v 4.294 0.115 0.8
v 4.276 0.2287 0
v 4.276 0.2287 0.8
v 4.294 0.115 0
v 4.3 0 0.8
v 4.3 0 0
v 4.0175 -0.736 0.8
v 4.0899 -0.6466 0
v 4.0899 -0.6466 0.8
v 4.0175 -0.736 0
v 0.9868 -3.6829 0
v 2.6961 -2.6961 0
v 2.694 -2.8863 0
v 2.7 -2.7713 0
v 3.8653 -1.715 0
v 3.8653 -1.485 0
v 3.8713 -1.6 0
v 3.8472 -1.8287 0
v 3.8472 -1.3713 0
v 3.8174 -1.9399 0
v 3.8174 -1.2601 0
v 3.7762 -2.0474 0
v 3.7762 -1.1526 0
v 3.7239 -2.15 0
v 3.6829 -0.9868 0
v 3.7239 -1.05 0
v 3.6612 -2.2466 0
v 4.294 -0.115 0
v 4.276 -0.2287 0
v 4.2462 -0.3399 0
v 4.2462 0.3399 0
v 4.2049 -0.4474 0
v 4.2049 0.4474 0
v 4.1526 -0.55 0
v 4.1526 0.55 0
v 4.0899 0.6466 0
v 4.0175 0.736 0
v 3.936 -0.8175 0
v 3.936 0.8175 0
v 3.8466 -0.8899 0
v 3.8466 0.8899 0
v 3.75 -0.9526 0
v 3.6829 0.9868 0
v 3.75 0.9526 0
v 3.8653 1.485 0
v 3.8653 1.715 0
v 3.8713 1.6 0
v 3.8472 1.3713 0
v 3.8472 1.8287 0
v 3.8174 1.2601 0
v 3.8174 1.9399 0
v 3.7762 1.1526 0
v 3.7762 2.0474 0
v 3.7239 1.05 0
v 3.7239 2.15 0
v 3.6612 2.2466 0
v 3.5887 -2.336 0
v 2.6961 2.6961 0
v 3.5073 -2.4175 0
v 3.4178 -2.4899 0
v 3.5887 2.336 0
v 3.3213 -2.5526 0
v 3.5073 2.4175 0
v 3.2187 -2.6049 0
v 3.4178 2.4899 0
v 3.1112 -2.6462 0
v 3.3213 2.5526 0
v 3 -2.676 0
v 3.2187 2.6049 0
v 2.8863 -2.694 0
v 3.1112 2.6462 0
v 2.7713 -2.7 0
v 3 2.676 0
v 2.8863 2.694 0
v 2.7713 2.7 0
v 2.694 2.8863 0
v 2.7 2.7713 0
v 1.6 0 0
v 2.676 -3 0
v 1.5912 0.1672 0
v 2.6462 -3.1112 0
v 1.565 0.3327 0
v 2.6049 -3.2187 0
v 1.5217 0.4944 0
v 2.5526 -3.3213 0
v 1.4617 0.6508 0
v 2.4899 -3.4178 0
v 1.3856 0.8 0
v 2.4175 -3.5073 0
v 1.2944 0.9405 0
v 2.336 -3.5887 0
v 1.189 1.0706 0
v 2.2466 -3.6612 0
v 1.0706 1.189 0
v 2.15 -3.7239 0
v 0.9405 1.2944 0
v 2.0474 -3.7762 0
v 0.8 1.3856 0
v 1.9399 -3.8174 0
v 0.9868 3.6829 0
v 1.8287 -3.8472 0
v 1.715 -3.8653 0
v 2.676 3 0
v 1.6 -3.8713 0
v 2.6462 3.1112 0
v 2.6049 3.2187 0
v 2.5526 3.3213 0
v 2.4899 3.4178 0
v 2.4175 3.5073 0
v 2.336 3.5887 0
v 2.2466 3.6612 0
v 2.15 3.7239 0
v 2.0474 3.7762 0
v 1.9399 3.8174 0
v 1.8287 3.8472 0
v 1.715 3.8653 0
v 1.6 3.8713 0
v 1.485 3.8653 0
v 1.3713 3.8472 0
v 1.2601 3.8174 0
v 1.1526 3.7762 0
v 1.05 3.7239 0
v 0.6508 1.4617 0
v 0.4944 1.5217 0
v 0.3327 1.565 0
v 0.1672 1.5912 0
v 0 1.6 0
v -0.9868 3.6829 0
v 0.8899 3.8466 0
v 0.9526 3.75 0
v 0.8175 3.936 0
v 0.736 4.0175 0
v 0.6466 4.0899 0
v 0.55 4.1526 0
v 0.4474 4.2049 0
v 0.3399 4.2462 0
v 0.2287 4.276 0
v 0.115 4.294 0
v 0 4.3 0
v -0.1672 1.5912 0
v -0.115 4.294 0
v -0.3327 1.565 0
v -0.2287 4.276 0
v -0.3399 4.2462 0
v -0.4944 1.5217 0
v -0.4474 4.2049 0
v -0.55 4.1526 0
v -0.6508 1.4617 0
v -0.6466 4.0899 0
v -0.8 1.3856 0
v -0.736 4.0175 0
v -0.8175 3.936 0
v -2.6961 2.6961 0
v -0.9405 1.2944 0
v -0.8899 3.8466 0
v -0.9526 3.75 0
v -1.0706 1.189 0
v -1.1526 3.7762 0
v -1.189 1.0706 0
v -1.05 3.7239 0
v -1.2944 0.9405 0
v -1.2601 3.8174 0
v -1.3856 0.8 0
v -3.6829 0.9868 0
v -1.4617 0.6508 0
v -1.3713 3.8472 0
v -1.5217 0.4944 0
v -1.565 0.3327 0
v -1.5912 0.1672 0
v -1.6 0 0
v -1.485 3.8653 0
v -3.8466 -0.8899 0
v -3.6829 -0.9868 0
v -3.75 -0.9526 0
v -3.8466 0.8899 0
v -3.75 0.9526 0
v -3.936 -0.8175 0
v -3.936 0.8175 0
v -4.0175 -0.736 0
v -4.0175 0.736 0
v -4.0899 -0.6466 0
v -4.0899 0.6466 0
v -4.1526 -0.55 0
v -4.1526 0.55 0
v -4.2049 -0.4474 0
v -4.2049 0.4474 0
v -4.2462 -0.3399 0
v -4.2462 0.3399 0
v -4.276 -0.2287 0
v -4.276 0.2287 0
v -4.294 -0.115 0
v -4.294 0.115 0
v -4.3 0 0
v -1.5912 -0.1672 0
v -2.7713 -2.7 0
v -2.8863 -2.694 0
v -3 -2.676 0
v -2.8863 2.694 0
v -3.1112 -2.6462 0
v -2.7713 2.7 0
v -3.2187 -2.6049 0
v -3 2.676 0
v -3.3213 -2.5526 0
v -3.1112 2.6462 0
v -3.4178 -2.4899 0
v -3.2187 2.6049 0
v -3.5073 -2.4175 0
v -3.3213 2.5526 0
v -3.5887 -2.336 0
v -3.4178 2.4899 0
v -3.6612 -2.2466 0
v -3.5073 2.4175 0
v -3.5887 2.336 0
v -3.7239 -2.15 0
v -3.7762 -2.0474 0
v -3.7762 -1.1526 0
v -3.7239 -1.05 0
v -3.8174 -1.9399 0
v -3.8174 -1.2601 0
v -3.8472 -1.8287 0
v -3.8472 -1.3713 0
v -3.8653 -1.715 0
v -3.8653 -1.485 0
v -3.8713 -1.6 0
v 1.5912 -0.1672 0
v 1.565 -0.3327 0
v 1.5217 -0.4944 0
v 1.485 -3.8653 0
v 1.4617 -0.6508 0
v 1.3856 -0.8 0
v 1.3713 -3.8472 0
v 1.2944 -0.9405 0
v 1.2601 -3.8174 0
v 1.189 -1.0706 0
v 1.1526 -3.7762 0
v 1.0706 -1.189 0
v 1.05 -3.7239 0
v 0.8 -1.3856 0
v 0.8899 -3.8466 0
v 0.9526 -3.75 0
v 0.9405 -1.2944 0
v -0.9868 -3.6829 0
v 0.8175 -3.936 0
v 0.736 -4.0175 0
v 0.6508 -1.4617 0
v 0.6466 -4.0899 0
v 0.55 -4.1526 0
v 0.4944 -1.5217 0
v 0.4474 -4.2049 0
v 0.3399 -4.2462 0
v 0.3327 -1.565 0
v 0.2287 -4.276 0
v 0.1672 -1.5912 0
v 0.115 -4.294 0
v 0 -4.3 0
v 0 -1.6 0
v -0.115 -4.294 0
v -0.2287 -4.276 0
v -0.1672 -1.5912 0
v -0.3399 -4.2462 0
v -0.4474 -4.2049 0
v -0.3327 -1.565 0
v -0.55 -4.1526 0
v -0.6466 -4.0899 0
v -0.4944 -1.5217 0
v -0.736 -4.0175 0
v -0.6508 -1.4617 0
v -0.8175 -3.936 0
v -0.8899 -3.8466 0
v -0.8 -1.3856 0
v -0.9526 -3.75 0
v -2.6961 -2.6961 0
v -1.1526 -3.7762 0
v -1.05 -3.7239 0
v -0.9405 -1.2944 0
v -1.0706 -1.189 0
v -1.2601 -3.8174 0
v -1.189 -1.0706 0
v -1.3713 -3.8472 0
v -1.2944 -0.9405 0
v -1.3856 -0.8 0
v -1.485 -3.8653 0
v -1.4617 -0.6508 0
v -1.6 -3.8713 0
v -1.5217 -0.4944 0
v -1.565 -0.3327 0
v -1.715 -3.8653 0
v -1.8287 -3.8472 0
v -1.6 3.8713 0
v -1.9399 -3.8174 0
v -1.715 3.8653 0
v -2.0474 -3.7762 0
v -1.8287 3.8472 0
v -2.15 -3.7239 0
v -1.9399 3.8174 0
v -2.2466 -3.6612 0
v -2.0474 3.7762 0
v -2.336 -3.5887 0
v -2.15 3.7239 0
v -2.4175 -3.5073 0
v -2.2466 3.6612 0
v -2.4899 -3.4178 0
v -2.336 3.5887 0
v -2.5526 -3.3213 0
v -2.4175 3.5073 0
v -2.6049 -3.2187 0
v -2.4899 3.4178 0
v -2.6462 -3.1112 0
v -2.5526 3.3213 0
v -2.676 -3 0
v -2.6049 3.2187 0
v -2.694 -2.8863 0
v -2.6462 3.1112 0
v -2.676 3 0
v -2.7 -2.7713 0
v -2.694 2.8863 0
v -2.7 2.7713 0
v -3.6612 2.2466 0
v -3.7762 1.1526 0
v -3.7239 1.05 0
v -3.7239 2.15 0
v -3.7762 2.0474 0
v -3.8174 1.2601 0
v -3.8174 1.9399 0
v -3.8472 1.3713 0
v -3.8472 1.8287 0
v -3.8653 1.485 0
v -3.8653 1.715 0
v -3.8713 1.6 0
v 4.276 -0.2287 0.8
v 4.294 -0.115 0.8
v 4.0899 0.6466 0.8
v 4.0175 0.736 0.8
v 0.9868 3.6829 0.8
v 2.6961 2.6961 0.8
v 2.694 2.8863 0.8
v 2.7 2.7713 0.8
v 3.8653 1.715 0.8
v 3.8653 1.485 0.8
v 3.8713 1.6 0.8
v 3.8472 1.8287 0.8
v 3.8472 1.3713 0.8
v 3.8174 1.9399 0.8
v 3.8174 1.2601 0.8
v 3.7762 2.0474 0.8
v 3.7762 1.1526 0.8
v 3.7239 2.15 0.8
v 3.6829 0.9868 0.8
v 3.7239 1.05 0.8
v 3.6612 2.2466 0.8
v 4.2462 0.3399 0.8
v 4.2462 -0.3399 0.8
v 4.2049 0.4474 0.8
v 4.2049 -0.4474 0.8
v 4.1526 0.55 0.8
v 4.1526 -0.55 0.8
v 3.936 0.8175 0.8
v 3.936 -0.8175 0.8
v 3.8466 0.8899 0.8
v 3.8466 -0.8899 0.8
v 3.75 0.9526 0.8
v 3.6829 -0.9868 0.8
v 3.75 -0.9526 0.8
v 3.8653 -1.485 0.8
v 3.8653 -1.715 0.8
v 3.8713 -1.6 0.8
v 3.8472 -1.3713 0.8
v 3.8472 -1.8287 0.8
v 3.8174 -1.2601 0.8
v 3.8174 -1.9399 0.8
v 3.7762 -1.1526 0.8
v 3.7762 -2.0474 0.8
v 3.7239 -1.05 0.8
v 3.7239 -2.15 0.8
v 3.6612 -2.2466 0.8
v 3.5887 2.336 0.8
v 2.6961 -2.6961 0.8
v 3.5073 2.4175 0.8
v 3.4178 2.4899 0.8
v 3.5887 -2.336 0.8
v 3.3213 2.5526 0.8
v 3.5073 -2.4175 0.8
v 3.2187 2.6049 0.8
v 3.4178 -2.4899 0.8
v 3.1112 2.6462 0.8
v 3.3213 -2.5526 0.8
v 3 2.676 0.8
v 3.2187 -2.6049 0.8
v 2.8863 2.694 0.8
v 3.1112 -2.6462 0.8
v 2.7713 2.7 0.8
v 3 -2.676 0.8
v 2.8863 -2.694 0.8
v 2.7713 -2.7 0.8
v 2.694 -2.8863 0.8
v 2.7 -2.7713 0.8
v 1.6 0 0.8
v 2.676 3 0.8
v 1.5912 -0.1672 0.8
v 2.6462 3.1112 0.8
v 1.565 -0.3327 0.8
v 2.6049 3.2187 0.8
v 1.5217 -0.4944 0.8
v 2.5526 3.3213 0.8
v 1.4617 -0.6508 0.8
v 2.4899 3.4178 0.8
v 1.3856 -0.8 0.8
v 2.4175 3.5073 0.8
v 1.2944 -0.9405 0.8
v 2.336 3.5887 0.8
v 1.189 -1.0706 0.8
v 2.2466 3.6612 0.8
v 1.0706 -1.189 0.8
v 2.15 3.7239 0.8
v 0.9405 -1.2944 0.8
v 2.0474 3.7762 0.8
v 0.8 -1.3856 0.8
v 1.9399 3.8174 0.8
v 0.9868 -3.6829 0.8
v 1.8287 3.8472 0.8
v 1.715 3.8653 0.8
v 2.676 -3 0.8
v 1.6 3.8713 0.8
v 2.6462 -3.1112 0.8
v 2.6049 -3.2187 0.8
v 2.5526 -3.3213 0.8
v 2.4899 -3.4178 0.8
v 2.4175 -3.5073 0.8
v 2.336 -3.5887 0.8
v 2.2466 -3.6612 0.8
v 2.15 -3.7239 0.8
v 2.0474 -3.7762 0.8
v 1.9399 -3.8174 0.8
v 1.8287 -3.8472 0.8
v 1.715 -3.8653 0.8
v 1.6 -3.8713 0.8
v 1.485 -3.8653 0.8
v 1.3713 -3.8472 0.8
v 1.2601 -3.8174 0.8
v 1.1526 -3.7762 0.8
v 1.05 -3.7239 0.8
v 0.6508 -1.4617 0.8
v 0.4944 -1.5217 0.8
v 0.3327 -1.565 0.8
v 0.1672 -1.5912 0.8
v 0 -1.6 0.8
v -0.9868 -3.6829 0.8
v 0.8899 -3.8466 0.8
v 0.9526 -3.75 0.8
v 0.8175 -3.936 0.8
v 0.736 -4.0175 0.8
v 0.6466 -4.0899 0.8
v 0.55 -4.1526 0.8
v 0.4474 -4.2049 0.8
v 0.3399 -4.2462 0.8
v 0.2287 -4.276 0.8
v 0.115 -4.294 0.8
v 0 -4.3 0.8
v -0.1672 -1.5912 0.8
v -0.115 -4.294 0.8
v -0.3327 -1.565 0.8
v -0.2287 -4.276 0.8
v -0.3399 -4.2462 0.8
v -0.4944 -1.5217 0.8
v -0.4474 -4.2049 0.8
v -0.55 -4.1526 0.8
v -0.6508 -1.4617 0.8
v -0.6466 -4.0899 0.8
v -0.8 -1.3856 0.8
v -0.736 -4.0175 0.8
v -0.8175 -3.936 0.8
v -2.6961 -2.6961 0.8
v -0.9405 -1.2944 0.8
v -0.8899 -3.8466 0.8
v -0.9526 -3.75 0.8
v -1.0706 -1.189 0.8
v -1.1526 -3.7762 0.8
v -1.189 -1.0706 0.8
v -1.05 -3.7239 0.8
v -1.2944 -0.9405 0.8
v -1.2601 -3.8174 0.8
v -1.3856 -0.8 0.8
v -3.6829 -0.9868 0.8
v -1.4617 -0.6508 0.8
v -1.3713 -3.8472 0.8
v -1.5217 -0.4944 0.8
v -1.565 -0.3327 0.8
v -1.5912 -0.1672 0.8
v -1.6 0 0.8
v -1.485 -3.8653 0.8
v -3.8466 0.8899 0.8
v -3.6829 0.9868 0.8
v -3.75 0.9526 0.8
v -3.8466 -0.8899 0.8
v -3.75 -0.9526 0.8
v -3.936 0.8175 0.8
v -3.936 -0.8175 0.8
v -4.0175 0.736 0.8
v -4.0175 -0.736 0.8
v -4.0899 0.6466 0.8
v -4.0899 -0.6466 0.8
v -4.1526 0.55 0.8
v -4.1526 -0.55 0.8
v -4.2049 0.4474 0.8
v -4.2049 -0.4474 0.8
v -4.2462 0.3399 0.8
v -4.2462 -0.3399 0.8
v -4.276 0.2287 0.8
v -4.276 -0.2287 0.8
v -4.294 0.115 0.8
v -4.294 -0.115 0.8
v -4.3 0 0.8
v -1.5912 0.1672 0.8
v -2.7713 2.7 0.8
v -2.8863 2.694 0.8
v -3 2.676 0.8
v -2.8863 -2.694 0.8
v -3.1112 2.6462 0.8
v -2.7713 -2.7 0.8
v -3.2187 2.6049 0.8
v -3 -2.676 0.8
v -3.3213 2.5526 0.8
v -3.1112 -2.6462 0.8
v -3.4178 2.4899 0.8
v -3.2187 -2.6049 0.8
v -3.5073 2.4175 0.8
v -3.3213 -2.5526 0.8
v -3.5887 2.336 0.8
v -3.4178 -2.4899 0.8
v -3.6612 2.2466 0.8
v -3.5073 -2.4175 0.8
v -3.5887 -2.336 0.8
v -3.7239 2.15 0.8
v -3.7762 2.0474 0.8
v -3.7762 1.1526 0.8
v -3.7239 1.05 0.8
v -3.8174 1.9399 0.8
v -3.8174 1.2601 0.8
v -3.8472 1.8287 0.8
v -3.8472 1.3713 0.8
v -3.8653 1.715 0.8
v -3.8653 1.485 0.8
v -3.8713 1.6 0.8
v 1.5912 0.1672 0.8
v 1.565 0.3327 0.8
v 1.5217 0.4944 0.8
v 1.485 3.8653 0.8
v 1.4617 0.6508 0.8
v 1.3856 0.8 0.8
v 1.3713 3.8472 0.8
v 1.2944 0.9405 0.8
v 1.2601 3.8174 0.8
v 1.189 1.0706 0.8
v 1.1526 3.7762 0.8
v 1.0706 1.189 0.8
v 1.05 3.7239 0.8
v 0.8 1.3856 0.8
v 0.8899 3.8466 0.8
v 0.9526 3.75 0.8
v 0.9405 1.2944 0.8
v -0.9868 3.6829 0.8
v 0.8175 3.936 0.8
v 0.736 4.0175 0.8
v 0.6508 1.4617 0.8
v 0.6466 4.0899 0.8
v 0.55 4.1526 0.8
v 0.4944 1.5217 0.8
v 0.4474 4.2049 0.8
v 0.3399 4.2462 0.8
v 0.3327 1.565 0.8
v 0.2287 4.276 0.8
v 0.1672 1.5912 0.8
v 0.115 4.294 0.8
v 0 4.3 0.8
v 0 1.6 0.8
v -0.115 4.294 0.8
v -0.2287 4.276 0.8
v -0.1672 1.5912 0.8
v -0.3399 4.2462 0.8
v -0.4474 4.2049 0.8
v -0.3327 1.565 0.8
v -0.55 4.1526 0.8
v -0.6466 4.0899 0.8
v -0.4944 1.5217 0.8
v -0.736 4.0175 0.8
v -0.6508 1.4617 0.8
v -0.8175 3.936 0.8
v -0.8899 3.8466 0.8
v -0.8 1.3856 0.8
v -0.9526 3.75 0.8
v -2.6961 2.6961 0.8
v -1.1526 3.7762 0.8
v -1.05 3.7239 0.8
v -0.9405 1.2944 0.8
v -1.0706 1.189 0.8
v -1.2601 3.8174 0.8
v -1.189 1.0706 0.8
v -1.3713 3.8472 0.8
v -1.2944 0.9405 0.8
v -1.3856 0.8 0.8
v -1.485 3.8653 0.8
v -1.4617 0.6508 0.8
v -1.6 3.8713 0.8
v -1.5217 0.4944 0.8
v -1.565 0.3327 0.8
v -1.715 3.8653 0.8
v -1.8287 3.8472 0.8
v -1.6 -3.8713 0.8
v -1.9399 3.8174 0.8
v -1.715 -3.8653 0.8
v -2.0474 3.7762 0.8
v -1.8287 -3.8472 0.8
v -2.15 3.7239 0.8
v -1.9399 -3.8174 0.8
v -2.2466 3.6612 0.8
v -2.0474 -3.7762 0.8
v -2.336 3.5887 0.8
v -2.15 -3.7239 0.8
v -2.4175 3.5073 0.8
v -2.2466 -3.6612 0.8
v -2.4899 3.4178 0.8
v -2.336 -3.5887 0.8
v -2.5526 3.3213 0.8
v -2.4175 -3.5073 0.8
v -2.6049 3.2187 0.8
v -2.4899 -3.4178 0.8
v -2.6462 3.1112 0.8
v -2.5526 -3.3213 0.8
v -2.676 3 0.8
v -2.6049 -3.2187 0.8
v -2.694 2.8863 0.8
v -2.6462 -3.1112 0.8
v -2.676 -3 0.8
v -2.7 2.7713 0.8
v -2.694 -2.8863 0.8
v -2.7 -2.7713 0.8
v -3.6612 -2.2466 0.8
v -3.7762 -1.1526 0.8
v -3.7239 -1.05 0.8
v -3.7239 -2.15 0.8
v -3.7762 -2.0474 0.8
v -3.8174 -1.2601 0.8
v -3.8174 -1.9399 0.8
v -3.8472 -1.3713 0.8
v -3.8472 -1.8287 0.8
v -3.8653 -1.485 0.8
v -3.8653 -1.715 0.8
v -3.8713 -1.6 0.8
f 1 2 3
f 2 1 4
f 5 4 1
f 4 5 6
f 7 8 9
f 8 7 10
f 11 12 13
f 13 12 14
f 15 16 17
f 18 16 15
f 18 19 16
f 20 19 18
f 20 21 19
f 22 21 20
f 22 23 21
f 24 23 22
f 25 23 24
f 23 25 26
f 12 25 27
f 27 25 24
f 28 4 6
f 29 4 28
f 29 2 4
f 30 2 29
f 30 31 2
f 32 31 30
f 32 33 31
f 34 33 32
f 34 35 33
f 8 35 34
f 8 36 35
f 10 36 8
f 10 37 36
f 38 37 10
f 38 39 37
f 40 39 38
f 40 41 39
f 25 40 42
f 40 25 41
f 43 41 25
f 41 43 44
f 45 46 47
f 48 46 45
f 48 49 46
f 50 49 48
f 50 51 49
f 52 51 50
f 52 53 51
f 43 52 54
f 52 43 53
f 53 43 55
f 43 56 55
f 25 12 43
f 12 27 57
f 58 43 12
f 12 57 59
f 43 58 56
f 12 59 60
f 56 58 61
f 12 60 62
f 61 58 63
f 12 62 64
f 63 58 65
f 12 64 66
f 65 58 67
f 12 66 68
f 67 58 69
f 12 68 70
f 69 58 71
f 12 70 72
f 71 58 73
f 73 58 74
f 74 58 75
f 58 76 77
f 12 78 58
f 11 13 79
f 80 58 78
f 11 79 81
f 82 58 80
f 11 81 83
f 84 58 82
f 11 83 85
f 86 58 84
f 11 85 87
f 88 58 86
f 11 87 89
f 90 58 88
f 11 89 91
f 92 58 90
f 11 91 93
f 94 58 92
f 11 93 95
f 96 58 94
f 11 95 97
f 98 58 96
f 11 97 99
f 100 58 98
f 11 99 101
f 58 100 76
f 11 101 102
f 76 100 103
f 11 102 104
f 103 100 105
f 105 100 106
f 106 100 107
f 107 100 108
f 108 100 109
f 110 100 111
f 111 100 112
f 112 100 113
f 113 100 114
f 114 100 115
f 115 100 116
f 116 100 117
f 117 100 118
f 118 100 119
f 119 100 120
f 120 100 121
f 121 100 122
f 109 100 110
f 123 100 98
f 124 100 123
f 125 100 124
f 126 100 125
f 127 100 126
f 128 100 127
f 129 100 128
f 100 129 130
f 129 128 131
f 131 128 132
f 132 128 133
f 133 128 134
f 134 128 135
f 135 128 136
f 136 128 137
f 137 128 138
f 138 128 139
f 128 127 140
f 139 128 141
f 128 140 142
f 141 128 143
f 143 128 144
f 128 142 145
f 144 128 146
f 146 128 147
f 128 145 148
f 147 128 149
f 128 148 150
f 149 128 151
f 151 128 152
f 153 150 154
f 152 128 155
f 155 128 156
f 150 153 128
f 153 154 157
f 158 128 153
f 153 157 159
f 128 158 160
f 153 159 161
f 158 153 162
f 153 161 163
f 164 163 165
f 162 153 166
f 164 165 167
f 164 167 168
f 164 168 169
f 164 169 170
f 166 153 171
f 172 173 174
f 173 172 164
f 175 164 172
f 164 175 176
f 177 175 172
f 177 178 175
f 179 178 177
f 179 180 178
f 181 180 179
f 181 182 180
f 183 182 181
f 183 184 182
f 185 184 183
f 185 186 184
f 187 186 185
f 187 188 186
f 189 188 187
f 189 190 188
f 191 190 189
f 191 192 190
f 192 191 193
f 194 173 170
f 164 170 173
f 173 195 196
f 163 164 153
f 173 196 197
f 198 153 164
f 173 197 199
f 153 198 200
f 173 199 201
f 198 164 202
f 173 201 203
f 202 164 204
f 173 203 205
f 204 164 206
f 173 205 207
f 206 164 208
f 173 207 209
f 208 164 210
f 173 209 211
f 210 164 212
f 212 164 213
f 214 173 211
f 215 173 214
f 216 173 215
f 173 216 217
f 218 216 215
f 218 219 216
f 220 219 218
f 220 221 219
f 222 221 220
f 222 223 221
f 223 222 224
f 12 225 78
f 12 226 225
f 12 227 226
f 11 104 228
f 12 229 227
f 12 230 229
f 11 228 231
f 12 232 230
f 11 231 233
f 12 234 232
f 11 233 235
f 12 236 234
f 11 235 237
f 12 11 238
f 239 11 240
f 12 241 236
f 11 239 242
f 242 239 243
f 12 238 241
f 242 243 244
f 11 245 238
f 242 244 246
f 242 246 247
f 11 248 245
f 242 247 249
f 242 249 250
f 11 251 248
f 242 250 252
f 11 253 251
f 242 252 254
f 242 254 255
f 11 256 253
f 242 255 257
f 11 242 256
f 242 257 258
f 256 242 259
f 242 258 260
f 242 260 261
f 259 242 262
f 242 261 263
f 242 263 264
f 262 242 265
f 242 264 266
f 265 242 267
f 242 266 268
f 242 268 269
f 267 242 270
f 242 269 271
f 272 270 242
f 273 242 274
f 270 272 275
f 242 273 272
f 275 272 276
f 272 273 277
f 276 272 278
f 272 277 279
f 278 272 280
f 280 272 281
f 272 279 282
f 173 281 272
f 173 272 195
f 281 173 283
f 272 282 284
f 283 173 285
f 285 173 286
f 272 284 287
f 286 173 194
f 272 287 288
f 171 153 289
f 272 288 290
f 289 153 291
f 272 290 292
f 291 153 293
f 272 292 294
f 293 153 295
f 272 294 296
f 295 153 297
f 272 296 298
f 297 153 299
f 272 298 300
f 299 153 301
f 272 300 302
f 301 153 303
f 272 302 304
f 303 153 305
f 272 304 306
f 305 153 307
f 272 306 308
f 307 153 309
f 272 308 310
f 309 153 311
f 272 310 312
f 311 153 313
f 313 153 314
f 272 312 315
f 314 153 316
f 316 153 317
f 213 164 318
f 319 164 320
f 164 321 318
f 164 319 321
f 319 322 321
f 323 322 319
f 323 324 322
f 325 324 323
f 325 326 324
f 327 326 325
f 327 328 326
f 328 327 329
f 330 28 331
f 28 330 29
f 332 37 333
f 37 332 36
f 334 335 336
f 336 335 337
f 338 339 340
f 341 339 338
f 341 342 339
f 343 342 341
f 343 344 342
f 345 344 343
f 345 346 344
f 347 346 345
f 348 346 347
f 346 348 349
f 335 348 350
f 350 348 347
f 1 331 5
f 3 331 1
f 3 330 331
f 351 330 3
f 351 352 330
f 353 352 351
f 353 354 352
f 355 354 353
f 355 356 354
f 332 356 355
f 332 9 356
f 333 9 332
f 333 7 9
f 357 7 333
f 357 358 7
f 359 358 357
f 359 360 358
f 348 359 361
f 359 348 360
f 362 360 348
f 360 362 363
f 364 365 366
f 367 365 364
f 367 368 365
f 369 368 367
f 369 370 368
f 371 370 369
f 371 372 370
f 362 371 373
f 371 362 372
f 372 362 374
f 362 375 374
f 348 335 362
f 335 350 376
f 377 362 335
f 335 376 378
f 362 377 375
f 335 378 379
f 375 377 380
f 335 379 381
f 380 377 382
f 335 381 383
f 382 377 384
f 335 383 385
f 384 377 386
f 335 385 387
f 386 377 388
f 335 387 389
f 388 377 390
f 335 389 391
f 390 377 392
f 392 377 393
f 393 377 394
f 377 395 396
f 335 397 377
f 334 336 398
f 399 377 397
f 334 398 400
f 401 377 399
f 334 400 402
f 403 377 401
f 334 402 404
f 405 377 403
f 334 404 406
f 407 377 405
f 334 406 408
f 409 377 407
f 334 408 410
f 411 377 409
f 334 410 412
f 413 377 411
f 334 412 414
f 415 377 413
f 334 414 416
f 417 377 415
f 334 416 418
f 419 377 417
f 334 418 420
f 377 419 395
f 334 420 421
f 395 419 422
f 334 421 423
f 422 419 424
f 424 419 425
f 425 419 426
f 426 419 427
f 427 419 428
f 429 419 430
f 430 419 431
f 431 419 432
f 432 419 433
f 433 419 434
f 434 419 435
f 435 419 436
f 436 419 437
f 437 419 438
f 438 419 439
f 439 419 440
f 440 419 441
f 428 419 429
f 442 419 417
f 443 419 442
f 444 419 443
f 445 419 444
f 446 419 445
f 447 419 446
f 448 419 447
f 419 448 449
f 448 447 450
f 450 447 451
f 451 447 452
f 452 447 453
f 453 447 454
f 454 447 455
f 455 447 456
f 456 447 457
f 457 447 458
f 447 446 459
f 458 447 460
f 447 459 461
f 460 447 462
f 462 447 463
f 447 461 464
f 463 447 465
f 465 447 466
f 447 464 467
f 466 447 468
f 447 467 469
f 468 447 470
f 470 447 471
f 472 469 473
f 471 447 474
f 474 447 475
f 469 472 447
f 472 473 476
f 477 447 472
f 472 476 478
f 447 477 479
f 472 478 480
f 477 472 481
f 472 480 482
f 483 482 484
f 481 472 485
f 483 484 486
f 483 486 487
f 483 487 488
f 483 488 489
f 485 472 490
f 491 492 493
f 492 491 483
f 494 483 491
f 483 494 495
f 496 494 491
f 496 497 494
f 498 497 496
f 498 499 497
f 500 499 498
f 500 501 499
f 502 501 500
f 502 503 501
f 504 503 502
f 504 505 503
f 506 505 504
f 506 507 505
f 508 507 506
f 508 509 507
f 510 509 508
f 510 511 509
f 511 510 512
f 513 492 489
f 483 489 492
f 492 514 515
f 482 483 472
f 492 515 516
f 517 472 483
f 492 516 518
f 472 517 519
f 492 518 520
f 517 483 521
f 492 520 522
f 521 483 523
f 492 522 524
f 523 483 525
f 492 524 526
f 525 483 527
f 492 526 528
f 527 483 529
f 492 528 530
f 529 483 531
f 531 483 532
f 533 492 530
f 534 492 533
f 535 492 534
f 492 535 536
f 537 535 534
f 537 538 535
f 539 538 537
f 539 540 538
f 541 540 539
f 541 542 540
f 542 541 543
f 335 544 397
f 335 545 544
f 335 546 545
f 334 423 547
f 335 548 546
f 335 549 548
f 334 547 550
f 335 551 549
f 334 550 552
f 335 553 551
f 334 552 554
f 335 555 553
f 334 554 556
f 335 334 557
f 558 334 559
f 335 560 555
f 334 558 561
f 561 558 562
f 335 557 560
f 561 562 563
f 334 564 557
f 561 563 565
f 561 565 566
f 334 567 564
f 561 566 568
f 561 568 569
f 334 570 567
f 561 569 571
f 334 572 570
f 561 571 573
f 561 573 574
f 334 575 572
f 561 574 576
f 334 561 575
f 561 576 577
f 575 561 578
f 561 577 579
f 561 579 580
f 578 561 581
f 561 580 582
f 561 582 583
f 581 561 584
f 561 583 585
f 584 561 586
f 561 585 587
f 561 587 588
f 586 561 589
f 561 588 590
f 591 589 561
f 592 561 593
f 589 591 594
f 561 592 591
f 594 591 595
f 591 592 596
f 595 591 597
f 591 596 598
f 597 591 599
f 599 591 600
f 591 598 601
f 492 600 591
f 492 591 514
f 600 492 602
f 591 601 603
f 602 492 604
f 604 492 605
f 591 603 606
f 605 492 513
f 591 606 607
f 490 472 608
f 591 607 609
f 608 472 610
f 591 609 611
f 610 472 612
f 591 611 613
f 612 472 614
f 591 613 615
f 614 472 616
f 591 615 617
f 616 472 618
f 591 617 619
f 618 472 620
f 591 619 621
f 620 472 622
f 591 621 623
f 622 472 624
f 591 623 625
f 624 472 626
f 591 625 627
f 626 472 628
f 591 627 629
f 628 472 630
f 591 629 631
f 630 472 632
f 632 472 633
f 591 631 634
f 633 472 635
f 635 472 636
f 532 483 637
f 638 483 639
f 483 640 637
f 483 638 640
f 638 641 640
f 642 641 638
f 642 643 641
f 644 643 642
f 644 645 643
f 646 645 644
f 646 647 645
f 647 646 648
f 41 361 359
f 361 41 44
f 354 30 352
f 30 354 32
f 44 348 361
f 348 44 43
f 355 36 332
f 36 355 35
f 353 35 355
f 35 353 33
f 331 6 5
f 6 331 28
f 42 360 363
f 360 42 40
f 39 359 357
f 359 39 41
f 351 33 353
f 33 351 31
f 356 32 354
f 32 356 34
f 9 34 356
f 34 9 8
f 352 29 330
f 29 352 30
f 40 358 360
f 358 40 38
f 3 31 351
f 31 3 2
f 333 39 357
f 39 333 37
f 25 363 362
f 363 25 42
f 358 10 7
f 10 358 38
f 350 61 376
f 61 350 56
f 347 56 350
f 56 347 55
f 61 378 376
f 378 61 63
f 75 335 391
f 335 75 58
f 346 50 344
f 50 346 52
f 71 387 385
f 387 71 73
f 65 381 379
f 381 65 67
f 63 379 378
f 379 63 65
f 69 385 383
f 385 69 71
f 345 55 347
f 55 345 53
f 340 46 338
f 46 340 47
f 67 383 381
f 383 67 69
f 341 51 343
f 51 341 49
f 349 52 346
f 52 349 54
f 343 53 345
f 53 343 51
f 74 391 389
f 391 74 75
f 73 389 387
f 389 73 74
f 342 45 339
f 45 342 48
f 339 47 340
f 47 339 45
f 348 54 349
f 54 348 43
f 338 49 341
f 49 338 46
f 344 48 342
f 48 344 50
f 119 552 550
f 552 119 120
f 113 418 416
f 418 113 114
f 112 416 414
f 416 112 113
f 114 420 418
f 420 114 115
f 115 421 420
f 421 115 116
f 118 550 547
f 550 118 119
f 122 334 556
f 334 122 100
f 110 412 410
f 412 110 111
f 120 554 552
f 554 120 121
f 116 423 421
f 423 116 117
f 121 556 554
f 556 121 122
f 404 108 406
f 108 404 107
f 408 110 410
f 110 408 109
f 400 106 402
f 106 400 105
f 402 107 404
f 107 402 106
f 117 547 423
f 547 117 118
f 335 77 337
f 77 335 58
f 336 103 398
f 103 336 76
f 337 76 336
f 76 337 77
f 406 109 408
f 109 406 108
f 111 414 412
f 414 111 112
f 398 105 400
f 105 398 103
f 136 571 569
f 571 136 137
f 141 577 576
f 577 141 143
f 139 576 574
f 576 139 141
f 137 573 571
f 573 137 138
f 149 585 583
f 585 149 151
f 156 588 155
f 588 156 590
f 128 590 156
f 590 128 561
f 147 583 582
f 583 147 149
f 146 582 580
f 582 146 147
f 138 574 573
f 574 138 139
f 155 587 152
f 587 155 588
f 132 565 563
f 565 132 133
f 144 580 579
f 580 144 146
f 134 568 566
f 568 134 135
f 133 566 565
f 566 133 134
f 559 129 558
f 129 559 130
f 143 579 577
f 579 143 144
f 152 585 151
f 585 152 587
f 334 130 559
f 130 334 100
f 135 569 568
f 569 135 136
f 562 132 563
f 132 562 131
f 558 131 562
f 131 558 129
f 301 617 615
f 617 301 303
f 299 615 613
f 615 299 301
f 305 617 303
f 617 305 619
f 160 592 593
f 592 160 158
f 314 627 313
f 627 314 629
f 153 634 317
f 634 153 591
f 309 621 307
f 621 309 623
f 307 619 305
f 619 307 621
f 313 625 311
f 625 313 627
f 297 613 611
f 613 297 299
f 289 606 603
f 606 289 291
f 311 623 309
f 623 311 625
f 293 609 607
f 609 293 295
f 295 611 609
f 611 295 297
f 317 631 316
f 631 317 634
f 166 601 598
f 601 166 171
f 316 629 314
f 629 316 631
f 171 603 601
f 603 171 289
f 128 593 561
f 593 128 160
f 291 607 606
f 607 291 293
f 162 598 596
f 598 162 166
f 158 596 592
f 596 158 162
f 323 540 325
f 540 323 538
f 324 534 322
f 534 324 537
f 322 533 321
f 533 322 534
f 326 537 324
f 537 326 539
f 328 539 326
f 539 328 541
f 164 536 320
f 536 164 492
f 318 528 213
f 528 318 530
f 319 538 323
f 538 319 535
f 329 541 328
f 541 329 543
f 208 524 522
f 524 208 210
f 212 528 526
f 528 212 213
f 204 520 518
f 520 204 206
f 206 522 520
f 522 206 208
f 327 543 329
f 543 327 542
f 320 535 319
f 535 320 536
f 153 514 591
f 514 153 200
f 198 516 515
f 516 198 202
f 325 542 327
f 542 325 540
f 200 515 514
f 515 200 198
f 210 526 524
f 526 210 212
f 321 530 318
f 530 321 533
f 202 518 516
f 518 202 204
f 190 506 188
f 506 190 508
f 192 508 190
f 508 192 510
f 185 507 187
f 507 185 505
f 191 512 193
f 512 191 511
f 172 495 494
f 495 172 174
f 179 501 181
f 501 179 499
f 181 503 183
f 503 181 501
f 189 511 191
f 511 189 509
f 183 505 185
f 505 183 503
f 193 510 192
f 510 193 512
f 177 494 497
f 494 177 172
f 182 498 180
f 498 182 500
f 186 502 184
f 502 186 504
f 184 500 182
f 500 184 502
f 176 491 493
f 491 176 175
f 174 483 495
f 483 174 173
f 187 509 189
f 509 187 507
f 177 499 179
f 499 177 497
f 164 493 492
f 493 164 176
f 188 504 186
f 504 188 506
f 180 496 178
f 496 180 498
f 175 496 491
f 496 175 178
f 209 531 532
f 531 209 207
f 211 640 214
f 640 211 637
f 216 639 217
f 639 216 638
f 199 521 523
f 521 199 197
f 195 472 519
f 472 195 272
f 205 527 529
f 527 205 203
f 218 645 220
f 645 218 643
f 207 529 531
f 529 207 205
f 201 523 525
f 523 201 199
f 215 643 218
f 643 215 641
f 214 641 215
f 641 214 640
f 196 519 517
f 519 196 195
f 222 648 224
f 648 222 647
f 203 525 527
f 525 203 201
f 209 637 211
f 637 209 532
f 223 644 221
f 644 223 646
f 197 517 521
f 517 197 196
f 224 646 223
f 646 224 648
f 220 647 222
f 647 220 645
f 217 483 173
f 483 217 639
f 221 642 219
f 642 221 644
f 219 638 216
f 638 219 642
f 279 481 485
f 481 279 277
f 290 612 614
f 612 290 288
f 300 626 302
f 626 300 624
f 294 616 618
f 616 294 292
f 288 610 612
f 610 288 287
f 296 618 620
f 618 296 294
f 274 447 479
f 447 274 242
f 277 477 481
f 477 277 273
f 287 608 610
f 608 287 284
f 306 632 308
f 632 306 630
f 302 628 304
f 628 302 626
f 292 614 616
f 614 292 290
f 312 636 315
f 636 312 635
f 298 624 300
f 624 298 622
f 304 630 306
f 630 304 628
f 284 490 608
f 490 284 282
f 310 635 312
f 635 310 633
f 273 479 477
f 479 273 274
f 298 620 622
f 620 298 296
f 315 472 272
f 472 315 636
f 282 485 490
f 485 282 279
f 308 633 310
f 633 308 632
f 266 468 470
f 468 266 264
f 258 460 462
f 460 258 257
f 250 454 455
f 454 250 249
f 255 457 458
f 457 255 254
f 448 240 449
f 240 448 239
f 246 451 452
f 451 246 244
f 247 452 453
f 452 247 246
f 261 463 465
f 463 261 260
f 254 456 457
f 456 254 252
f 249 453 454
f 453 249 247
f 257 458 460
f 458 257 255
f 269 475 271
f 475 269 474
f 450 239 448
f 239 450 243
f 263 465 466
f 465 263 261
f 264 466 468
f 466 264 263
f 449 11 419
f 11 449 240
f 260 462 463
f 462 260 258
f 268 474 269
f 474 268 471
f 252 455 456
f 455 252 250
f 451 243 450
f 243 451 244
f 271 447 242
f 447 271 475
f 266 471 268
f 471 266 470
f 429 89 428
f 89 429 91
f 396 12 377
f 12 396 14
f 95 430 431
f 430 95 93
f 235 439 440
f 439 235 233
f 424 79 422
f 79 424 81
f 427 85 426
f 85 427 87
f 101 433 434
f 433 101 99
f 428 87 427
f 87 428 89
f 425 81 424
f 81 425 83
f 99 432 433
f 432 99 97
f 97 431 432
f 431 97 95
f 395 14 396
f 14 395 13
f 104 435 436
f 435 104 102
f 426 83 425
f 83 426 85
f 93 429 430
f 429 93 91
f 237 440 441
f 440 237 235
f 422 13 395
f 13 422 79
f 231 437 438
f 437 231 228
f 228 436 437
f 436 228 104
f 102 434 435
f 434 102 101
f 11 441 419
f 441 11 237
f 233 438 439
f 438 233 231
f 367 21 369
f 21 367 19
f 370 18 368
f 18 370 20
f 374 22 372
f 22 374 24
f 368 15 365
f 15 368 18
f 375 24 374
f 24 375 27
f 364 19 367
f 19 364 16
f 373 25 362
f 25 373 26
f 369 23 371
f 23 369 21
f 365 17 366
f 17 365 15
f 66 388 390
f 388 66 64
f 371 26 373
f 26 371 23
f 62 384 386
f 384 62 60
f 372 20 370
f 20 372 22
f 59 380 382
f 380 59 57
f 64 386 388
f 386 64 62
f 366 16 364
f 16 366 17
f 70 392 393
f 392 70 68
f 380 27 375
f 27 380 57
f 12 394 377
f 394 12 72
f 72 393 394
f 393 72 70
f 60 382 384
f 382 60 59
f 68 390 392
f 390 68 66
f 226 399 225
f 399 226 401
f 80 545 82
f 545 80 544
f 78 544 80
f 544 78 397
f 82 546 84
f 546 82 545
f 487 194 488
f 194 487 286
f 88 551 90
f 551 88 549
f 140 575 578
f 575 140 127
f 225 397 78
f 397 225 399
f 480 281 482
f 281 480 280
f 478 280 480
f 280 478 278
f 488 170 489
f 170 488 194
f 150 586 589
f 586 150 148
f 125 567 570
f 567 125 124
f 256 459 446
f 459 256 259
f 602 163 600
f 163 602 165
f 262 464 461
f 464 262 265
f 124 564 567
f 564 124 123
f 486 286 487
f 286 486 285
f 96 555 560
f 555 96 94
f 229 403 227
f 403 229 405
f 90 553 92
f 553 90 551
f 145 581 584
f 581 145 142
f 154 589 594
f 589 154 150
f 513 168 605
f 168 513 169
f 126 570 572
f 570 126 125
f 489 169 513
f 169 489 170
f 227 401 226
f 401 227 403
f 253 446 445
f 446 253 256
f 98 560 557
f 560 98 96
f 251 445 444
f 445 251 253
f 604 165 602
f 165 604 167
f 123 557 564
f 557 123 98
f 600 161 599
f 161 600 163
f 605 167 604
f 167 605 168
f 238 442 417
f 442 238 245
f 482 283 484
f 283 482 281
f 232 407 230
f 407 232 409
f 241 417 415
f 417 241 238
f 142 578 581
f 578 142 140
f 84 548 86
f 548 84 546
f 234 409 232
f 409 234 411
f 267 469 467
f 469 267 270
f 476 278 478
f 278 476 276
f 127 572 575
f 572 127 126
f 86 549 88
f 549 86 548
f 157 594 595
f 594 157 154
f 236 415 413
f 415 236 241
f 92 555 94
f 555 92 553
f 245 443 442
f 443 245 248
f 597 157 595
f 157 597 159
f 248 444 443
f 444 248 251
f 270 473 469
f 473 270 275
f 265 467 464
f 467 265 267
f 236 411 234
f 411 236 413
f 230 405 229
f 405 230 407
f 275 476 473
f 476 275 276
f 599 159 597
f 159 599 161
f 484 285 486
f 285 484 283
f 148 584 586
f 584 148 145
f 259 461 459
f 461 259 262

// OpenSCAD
// External-serrated lock washer.
$fn = 60;
eps = 0.02;
inner_d = 3.2;
outer_d = 8;
thickness = 0.8;
teeth = 12;
difference() {
    union() {
        cylinder(d=outer_d-1.2,h=thickness);
        for(i=[0:teeth-1]) rotate([0,0,i*360/teeth]) translate([outer_d/2-0.8,0,0]) cylinder(d=2.2,h=thickness);
    }
    translate([0,0,-eps]) cylinder(d=inner_d,h=thickness+2*eps);
}
